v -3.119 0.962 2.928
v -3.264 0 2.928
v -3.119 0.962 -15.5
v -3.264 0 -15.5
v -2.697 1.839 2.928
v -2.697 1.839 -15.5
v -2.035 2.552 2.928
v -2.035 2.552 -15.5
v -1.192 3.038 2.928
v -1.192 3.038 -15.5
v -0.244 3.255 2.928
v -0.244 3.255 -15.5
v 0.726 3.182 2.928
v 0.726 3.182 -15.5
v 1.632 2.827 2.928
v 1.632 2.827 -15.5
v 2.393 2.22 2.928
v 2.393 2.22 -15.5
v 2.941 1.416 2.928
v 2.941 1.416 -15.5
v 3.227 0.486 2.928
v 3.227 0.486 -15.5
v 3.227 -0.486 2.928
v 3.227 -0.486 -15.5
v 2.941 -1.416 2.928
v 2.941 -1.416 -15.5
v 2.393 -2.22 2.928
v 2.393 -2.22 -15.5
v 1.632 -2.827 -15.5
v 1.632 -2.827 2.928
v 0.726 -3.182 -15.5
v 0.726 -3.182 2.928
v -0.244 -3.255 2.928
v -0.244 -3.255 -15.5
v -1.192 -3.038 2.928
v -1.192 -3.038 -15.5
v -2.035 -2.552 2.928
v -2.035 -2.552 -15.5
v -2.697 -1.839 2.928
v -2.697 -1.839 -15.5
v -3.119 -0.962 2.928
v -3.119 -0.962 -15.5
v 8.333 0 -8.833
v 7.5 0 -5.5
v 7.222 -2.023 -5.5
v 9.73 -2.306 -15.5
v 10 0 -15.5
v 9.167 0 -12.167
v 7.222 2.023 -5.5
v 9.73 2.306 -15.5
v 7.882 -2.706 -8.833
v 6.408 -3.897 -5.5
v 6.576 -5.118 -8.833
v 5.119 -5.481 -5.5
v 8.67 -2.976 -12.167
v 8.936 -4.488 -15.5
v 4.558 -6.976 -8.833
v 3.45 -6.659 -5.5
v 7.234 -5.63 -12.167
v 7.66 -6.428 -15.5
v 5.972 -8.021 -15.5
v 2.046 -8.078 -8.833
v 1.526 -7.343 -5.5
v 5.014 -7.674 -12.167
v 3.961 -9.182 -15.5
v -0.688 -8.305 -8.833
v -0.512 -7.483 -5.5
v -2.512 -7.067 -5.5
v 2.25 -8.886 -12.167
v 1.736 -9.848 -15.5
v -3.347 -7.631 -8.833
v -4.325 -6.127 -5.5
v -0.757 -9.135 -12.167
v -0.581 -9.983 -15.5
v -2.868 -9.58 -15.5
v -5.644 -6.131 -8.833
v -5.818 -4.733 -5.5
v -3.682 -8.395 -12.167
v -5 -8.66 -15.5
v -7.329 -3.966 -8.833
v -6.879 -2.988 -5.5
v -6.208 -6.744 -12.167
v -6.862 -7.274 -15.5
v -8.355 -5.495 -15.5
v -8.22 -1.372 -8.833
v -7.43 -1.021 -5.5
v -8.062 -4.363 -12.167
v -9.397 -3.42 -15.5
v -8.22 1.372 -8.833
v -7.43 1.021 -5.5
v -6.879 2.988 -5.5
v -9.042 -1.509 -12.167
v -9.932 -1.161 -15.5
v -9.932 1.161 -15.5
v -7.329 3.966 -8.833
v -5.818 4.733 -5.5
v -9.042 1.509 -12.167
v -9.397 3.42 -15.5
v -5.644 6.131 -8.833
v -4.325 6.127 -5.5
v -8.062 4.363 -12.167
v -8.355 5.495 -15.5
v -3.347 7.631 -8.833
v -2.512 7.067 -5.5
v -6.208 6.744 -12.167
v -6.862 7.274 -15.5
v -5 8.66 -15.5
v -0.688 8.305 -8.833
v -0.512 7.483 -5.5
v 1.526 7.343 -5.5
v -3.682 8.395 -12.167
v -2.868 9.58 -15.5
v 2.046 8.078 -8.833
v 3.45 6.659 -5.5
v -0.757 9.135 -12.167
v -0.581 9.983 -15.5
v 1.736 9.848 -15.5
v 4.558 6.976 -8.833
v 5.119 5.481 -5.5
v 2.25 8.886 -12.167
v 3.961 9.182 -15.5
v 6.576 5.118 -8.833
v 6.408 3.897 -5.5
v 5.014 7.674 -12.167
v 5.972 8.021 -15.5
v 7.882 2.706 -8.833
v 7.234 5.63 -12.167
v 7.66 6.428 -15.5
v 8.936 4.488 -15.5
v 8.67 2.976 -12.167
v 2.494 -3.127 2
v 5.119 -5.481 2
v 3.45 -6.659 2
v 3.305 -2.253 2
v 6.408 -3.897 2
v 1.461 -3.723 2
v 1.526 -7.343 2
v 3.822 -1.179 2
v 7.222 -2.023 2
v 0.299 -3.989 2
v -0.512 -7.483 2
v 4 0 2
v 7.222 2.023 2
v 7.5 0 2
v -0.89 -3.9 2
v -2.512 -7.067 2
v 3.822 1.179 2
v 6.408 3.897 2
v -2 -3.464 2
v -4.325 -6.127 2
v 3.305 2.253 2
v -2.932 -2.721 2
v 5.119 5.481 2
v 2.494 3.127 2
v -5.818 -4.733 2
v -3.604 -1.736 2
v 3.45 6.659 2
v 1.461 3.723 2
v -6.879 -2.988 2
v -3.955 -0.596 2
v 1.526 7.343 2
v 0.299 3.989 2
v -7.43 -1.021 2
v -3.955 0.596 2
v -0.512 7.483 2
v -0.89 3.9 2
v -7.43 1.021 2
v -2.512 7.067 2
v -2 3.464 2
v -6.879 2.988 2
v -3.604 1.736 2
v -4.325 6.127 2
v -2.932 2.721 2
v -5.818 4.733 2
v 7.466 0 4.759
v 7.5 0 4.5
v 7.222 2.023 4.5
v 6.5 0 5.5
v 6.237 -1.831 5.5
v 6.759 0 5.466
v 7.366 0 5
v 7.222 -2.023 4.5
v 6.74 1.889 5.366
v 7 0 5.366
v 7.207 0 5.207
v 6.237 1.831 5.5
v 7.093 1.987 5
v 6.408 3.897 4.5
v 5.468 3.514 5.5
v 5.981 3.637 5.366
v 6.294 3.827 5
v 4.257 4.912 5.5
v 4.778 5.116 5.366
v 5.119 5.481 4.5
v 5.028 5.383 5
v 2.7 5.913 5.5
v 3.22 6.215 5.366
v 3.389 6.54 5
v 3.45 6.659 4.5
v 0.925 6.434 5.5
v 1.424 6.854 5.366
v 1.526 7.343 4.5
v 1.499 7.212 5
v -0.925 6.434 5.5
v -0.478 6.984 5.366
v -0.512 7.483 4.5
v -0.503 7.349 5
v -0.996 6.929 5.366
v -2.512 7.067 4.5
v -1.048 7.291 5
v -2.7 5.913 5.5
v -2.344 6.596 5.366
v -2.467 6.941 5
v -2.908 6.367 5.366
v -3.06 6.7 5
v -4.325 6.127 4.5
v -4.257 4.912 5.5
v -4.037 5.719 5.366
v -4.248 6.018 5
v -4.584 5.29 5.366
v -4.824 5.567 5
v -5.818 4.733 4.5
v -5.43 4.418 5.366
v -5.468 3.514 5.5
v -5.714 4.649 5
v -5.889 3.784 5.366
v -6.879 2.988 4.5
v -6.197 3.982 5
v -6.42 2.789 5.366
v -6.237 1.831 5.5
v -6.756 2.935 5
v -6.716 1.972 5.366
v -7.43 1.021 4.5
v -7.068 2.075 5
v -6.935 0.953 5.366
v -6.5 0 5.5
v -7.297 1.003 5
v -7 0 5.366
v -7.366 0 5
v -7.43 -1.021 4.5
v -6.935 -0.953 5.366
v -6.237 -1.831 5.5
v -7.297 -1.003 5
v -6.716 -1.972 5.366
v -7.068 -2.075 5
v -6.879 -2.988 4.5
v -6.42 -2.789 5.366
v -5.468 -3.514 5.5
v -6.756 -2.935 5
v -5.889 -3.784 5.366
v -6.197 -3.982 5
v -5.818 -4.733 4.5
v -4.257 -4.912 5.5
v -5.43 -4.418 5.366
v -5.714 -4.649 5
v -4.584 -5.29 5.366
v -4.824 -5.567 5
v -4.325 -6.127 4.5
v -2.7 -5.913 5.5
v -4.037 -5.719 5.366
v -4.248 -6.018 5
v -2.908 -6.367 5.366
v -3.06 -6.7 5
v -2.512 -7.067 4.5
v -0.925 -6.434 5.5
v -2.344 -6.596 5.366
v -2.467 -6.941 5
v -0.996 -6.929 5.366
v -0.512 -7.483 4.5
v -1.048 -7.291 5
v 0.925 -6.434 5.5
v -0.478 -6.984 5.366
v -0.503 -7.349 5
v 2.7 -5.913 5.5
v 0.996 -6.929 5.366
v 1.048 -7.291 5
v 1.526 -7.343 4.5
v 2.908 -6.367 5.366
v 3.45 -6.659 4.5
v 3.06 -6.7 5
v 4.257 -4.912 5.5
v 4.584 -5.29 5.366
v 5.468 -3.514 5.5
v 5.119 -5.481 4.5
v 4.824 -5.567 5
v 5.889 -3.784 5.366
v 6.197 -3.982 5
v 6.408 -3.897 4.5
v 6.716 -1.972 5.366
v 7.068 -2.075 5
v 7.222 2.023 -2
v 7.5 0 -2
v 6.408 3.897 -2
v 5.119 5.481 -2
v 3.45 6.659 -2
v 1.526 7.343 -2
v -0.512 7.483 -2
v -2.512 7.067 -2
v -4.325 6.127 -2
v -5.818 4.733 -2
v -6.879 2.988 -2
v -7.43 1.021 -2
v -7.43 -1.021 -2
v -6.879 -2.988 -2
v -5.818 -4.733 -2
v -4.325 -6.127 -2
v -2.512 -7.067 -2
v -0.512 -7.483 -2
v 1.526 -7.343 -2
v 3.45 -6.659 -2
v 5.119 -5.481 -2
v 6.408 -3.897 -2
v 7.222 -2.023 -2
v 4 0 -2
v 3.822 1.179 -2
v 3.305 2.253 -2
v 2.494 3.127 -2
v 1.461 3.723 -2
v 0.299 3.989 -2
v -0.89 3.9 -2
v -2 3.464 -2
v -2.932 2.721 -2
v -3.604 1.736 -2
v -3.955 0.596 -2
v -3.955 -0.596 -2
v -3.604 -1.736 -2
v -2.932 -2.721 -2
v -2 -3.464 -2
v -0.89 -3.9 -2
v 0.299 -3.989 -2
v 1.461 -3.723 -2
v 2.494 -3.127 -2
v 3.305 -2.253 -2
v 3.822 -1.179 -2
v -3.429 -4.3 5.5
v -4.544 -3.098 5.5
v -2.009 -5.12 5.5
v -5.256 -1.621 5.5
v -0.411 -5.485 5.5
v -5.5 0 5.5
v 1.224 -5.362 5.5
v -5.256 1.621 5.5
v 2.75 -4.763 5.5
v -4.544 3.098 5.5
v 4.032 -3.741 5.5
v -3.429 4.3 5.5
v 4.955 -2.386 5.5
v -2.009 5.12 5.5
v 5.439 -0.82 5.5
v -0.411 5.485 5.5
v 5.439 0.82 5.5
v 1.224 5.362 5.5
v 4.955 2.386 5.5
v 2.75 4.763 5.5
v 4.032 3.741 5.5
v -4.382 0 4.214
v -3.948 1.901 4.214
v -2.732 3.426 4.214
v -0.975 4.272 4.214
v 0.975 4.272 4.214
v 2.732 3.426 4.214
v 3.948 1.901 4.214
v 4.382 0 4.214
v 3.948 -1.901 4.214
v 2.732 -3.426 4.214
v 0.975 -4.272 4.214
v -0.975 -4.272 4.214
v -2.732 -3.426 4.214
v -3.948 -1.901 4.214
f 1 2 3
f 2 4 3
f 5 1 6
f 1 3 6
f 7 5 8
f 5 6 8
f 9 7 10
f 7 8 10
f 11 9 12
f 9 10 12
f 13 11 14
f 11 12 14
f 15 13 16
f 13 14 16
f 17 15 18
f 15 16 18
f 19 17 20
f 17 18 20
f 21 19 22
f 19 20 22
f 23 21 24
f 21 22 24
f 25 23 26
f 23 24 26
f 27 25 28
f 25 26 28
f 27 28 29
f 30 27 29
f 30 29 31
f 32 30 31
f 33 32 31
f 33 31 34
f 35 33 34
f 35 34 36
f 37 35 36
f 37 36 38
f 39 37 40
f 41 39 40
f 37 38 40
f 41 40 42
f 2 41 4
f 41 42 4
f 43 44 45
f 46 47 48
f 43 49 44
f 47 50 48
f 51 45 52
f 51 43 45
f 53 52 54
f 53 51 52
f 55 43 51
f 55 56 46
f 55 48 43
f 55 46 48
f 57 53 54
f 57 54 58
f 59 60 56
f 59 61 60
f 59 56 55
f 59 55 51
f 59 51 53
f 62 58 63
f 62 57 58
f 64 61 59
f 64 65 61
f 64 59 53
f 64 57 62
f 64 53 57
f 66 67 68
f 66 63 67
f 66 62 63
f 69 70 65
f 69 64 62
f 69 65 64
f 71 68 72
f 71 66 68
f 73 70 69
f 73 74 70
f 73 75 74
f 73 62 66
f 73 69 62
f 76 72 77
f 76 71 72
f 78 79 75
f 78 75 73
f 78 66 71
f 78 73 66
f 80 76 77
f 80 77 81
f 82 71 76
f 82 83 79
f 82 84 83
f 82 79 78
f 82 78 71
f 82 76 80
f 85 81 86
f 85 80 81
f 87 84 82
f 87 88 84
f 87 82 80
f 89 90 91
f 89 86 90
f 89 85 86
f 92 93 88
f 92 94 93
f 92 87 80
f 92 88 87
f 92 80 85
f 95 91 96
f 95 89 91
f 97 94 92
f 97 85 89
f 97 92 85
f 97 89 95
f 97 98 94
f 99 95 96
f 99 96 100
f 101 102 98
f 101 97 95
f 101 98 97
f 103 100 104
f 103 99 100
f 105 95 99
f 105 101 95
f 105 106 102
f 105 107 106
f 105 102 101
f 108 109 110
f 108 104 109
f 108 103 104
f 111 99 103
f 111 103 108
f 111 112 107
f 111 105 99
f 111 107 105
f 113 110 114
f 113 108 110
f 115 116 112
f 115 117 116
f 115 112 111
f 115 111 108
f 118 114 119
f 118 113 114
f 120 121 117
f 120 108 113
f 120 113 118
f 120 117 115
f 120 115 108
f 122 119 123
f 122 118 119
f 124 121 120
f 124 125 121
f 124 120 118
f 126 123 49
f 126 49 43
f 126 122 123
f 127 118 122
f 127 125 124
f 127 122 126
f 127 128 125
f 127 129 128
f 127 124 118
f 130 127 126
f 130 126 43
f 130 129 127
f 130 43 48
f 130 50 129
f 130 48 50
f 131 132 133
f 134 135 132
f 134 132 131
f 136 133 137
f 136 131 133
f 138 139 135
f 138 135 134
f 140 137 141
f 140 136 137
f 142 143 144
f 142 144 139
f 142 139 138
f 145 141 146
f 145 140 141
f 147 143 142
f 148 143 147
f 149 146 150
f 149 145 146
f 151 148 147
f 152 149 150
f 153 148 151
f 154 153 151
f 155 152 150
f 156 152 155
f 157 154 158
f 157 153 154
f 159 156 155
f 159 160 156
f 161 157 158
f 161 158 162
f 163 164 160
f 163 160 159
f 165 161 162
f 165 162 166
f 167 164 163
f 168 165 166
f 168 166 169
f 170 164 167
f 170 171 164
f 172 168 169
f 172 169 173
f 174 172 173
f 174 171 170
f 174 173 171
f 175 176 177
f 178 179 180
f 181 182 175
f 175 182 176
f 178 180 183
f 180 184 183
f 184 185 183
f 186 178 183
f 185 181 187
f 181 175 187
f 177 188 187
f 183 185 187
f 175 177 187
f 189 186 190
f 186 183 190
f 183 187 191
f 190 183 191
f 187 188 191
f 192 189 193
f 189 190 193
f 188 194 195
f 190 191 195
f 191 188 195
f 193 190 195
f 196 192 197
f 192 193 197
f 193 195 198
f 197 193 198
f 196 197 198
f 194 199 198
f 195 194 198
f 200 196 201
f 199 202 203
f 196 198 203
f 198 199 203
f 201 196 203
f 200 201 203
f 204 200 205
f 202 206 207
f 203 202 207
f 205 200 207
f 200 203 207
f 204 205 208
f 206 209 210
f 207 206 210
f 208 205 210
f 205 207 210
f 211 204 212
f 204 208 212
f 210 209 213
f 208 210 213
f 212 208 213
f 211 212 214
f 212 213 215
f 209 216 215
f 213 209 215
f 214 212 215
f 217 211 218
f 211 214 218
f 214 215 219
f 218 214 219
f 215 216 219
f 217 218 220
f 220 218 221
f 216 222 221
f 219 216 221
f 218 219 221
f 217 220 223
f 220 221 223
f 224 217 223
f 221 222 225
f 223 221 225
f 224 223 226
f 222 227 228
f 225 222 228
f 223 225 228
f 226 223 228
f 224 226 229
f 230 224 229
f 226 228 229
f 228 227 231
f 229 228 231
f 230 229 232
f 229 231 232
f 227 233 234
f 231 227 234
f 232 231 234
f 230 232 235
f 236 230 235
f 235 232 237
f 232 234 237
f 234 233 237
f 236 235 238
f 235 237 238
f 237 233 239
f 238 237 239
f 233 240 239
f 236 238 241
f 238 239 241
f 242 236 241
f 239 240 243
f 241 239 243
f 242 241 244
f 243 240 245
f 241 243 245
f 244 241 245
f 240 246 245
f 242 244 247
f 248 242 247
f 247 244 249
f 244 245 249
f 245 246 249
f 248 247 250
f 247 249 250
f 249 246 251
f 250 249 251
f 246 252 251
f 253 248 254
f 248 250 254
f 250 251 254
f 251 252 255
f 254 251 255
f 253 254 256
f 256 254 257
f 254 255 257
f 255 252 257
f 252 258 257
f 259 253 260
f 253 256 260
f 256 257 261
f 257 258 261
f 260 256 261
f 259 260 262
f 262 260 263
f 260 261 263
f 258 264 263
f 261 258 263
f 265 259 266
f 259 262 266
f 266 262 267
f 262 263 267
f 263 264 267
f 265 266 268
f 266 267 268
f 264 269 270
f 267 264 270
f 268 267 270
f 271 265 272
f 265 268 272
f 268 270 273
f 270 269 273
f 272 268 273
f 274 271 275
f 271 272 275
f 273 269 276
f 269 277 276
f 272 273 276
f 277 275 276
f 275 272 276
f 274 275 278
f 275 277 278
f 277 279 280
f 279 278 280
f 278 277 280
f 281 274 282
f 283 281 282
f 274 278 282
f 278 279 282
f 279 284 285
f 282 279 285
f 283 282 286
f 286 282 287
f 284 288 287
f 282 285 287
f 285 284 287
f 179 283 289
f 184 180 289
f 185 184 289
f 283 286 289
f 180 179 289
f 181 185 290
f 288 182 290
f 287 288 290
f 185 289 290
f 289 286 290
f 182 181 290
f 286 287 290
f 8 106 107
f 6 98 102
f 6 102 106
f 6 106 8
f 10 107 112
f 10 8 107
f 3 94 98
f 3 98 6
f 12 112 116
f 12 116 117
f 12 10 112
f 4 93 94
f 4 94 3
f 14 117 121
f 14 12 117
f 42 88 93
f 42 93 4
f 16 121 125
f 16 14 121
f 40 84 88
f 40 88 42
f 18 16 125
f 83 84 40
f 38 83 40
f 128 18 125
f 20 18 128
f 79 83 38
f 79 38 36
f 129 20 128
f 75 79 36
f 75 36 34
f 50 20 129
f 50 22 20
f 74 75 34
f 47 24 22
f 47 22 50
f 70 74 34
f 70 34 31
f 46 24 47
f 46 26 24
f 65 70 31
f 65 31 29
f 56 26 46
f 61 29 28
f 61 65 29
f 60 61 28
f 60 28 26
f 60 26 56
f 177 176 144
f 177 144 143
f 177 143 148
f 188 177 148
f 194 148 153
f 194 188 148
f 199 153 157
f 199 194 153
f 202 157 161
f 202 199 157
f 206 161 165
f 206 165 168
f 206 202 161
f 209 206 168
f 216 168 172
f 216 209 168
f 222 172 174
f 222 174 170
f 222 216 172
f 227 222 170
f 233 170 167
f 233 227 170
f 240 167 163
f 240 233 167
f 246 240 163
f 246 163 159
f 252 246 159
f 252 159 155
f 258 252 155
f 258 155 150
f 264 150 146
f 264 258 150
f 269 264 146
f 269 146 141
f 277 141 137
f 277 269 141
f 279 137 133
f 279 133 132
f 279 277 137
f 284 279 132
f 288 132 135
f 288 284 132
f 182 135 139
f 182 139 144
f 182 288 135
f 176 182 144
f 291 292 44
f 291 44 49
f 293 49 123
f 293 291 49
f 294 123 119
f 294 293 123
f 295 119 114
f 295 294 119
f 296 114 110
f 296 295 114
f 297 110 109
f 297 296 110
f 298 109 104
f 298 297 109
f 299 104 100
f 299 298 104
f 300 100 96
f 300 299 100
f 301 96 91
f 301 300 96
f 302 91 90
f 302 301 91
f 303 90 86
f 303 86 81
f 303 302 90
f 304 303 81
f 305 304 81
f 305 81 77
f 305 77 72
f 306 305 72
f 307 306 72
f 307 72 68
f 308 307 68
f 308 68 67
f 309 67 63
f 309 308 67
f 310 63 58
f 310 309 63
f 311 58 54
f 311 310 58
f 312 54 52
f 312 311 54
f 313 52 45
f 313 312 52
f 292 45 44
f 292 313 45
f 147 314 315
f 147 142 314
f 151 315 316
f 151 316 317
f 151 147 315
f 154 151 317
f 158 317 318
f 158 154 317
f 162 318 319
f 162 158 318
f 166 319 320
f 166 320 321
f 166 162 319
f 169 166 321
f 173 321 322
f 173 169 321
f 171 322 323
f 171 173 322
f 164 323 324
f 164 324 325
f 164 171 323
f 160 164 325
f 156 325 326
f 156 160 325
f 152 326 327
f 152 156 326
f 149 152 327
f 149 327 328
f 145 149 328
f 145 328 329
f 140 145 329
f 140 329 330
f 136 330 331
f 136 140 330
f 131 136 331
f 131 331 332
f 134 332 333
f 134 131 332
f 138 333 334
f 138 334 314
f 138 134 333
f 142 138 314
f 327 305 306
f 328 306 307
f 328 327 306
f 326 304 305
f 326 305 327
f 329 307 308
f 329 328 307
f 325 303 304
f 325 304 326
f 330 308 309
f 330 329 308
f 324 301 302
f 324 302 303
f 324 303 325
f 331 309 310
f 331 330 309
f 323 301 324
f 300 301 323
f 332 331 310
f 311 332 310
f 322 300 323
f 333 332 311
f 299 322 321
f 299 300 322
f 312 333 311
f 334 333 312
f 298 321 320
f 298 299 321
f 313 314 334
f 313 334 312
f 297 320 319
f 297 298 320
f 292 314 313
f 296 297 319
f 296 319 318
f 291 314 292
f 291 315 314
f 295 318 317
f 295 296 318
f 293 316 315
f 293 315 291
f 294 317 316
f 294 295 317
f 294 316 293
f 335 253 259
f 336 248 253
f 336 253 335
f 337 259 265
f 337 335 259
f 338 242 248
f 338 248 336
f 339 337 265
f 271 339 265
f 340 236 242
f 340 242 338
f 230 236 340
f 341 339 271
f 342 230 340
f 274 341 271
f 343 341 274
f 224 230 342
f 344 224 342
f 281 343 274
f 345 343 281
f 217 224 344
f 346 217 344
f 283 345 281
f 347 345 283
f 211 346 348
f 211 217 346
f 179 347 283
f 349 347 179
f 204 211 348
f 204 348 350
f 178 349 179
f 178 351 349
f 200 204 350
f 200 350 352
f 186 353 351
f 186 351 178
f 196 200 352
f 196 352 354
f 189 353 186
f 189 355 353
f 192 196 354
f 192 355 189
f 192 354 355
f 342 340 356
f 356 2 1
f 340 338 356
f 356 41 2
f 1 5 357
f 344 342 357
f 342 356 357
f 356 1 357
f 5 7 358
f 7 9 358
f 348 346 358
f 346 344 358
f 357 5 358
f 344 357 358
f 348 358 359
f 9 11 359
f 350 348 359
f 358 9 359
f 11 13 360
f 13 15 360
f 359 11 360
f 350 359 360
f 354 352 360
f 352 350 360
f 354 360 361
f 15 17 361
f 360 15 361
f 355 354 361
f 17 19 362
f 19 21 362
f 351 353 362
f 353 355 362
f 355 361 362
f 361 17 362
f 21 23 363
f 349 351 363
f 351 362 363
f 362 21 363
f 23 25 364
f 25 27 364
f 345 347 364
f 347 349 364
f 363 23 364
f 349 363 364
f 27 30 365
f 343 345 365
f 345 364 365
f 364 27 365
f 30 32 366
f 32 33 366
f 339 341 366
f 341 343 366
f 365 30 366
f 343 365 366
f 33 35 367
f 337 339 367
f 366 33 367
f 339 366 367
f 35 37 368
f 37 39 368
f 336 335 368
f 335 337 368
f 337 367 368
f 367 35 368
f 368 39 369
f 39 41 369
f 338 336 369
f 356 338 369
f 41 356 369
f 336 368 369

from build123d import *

# Parameters (mm, degrees)
F1_FACE_R      = 7.5
F3_R           = 10
F6_D           = 6.5278
F6_CSINK_D     = 11
F6_CSINK_ANGLE = 82
F7_R           = 1


with BuildPart() as f1:
    # F0 (on Front) → F1 (revolve)
    with BuildSketch(Plane.XZ):
        Polygon((0, 5.5), (0, 0), (0, -5.5), (7.5, -5.5), (7.5, -2), (4, -2), (4, 0), (4, 2), (7.5, 2), (7.5, 5.5), align=None)
    revolve(axis=Axis((0, 0, 2.75), (0, 0, 1)))

    # F1_face (on face) → F4 section 0
    with BuildSketch(Plane(origin=(0, 0, -5.5), x_dir=(1, 0, 0), z_dir=(0, 0, -1))):
        Circle(F1_FACE_R)
    # F3 (on offset) → F4 section 1
    with BuildSketch(Plane(origin=(0, 0, -15.5), x_dir=(1, 0, 0), z_dir=(0, 0, -1))):
        Circle(F3_R)
    loft()

    # F6 (through all)
    with Locations(Plane.XY.offset(5.5)):
        with Locations((0, 0)):
            CounterSinkHole(F6_D / 2, F6_CSINK_D / 2, counter_sink_angle=F6_CSINK_ANGLE)

    # F7
    f7_edges = [f1.edges().sort_by_distance(p)[0] for p in [
        (-7.5, 0, 5.5),
    ]]
    fillet(f7_edges, radius=F7_R)


solid = f1.part
